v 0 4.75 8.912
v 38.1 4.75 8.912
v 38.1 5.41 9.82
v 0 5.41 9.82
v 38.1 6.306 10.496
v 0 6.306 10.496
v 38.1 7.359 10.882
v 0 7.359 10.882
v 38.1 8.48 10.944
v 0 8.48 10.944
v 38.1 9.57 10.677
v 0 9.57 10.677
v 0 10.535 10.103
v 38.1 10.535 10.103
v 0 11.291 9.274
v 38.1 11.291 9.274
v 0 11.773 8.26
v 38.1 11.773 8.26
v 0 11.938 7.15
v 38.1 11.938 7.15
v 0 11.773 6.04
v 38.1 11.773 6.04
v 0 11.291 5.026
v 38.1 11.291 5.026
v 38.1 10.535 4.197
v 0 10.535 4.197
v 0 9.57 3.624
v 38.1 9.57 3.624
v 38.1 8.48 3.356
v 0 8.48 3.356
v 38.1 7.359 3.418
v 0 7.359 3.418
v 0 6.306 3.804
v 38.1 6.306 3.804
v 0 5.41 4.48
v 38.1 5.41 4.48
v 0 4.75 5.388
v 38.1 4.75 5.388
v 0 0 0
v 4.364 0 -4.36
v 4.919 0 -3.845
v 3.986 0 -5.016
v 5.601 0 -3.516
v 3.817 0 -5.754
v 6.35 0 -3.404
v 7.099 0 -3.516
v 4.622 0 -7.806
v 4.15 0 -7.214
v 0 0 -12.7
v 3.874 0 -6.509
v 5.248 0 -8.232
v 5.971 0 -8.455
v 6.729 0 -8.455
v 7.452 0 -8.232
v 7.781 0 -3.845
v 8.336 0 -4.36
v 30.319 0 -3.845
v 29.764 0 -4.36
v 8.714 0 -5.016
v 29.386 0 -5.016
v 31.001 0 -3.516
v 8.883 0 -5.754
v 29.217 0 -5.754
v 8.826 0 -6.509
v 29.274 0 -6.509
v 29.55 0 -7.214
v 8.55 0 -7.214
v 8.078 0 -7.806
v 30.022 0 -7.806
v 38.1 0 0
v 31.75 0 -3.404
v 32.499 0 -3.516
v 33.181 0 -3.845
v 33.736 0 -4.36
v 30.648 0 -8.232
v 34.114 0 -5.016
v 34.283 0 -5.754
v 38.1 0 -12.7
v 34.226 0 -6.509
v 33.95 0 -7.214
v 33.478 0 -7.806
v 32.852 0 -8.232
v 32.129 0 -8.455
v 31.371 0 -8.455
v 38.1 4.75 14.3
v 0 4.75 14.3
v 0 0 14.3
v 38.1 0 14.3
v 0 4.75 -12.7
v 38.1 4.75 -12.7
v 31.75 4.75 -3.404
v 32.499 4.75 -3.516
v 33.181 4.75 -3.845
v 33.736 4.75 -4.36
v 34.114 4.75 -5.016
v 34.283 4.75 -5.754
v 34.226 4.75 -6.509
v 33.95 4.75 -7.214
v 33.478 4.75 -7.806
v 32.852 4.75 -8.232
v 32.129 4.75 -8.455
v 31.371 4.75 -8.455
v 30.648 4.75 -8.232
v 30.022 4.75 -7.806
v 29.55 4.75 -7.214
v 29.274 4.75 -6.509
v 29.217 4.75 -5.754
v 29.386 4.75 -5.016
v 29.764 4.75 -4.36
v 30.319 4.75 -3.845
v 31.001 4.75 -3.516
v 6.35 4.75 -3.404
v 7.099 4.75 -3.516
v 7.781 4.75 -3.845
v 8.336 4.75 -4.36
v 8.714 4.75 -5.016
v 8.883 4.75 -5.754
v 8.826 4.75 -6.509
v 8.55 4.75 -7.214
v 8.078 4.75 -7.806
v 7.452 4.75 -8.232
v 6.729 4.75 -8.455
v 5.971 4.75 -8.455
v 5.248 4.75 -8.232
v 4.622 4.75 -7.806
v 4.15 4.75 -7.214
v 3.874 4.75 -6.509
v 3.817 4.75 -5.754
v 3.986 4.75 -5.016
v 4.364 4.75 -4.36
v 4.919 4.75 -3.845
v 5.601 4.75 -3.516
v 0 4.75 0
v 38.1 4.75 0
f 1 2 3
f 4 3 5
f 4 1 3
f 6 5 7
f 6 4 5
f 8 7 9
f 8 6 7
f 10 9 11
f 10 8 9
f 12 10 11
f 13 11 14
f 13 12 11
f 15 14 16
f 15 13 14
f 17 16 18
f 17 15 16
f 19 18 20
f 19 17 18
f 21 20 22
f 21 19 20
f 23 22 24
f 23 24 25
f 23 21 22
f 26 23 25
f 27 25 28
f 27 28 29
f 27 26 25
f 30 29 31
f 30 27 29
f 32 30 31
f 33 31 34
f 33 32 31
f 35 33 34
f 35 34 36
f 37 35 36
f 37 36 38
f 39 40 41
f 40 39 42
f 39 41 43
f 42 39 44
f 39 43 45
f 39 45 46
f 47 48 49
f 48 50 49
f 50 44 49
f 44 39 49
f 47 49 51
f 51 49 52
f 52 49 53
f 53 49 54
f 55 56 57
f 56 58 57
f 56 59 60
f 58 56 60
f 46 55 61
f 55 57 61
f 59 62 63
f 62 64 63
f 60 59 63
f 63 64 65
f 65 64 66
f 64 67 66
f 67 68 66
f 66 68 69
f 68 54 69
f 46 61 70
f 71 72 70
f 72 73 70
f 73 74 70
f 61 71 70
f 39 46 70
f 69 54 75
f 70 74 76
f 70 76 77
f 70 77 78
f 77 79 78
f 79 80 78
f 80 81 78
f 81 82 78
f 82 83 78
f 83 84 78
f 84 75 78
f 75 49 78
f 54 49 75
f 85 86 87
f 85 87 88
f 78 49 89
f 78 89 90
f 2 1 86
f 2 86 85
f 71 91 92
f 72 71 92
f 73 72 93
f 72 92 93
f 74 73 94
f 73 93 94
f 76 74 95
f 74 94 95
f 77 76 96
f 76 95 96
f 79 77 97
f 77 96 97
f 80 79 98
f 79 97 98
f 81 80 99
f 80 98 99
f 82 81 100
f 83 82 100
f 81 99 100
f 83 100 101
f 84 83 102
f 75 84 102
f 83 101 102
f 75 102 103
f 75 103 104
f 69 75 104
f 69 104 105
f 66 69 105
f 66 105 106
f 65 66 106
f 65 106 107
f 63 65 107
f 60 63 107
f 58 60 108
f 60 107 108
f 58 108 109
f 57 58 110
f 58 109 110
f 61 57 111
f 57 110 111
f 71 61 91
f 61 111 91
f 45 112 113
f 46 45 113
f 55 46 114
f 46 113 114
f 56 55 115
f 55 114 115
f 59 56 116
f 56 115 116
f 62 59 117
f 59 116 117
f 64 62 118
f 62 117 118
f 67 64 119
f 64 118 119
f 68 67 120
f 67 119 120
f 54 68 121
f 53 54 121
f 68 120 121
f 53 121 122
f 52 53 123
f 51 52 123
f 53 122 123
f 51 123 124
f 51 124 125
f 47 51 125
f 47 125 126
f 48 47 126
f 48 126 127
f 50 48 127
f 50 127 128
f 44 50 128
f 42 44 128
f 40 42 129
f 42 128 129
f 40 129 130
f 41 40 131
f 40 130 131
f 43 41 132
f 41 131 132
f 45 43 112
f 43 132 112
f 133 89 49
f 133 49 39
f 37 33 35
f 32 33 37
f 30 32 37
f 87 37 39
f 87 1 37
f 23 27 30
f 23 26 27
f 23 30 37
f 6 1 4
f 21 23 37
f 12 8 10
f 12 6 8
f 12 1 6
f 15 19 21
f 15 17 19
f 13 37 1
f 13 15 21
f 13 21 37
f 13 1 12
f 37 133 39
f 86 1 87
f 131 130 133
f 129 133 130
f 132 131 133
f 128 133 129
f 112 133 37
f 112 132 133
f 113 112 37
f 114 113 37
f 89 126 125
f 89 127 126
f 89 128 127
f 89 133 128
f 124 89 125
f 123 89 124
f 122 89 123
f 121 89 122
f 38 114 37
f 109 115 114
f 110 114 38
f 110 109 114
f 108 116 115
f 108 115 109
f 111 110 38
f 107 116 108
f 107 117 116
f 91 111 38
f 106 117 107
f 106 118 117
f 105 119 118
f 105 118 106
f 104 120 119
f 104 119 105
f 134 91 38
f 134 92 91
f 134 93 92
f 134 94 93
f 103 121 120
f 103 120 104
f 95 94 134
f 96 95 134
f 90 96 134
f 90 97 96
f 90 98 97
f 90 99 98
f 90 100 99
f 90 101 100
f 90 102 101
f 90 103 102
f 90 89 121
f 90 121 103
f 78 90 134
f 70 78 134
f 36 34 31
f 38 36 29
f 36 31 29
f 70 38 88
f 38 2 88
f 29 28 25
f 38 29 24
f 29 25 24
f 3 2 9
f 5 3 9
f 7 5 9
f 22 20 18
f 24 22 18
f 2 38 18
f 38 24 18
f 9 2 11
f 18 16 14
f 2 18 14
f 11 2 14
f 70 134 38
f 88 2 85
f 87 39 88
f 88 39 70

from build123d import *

# Parameters (mm, degrees)
SKETCH1_W           = 38.1
SKETCH1_H           = 12.7
BOSS_EXTRUDE1_DEPTH = 4.7498
SKETCH2_R           = 2.54
CUT_EXTRUDE1_DEPTH  = 4.7498
SKETCH4_W           = 38.1
SKETCH4_H           = 4.749919389
BOSS_EXTRUDE2_DEPTH = 14.3002
SKETCH5_R           = 3.81
BOSS_EXTRUDE3_DEPTH = 38.1


with BuildPart() as part:
    # Sketch1 → Boss-Extrude1 (new body)
    with BuildSketch(Plane(origin=(0, 0, 0), x_dir=(1, 0, 0), z_dir=(0, 1, 0))):
        with Locations((19.05, 6.35)):
            Rectangle(SKETCH1_W, SKETCH1_H)
    extrude(amount=BOSS_EXTRUDE1_DEPTH)

    # Sketch2 → Cut-Extrude1 (cut)
    with BuildSketch(Plane(origin=(0, 4.7498, 0), x_dir=(1, 0, 0), z_dir=(0, 1, 0))):
        with Locations(Location((6.35, 5.9436, 0), (0, 0, 270))):
            Circle(SKETCH2_R)
        with Locations(Location((31.75, 5.9436, 0), (0, 0, 270))):
            Circle(SKETCH2_R)
    extrude(amount=-CUT_EXTRUDE1_DEPTH, mode=Mode.SUBTRACT)

    # Sketch4 → Boss-Extrude2 (add)
    with BuildSketch(Plane.XY):
        with Locations((19.05, 2.374840306)):
            Rectangle(SKETCH4_W, SKETCH4_H)
    extrude(amount=BOSS_EXTRUDE2_DEPTH)

    # Sketch5 → Boss-Extrude3 (add)
    with BuildSketch(Plane.ZY):
        with Locations((7.1501, 8.127910458)):
            Circle(SKETCH5_R)
    extrude(amount=-BOSS_EXTRUDE3_DEPTH)


solid = part.part
